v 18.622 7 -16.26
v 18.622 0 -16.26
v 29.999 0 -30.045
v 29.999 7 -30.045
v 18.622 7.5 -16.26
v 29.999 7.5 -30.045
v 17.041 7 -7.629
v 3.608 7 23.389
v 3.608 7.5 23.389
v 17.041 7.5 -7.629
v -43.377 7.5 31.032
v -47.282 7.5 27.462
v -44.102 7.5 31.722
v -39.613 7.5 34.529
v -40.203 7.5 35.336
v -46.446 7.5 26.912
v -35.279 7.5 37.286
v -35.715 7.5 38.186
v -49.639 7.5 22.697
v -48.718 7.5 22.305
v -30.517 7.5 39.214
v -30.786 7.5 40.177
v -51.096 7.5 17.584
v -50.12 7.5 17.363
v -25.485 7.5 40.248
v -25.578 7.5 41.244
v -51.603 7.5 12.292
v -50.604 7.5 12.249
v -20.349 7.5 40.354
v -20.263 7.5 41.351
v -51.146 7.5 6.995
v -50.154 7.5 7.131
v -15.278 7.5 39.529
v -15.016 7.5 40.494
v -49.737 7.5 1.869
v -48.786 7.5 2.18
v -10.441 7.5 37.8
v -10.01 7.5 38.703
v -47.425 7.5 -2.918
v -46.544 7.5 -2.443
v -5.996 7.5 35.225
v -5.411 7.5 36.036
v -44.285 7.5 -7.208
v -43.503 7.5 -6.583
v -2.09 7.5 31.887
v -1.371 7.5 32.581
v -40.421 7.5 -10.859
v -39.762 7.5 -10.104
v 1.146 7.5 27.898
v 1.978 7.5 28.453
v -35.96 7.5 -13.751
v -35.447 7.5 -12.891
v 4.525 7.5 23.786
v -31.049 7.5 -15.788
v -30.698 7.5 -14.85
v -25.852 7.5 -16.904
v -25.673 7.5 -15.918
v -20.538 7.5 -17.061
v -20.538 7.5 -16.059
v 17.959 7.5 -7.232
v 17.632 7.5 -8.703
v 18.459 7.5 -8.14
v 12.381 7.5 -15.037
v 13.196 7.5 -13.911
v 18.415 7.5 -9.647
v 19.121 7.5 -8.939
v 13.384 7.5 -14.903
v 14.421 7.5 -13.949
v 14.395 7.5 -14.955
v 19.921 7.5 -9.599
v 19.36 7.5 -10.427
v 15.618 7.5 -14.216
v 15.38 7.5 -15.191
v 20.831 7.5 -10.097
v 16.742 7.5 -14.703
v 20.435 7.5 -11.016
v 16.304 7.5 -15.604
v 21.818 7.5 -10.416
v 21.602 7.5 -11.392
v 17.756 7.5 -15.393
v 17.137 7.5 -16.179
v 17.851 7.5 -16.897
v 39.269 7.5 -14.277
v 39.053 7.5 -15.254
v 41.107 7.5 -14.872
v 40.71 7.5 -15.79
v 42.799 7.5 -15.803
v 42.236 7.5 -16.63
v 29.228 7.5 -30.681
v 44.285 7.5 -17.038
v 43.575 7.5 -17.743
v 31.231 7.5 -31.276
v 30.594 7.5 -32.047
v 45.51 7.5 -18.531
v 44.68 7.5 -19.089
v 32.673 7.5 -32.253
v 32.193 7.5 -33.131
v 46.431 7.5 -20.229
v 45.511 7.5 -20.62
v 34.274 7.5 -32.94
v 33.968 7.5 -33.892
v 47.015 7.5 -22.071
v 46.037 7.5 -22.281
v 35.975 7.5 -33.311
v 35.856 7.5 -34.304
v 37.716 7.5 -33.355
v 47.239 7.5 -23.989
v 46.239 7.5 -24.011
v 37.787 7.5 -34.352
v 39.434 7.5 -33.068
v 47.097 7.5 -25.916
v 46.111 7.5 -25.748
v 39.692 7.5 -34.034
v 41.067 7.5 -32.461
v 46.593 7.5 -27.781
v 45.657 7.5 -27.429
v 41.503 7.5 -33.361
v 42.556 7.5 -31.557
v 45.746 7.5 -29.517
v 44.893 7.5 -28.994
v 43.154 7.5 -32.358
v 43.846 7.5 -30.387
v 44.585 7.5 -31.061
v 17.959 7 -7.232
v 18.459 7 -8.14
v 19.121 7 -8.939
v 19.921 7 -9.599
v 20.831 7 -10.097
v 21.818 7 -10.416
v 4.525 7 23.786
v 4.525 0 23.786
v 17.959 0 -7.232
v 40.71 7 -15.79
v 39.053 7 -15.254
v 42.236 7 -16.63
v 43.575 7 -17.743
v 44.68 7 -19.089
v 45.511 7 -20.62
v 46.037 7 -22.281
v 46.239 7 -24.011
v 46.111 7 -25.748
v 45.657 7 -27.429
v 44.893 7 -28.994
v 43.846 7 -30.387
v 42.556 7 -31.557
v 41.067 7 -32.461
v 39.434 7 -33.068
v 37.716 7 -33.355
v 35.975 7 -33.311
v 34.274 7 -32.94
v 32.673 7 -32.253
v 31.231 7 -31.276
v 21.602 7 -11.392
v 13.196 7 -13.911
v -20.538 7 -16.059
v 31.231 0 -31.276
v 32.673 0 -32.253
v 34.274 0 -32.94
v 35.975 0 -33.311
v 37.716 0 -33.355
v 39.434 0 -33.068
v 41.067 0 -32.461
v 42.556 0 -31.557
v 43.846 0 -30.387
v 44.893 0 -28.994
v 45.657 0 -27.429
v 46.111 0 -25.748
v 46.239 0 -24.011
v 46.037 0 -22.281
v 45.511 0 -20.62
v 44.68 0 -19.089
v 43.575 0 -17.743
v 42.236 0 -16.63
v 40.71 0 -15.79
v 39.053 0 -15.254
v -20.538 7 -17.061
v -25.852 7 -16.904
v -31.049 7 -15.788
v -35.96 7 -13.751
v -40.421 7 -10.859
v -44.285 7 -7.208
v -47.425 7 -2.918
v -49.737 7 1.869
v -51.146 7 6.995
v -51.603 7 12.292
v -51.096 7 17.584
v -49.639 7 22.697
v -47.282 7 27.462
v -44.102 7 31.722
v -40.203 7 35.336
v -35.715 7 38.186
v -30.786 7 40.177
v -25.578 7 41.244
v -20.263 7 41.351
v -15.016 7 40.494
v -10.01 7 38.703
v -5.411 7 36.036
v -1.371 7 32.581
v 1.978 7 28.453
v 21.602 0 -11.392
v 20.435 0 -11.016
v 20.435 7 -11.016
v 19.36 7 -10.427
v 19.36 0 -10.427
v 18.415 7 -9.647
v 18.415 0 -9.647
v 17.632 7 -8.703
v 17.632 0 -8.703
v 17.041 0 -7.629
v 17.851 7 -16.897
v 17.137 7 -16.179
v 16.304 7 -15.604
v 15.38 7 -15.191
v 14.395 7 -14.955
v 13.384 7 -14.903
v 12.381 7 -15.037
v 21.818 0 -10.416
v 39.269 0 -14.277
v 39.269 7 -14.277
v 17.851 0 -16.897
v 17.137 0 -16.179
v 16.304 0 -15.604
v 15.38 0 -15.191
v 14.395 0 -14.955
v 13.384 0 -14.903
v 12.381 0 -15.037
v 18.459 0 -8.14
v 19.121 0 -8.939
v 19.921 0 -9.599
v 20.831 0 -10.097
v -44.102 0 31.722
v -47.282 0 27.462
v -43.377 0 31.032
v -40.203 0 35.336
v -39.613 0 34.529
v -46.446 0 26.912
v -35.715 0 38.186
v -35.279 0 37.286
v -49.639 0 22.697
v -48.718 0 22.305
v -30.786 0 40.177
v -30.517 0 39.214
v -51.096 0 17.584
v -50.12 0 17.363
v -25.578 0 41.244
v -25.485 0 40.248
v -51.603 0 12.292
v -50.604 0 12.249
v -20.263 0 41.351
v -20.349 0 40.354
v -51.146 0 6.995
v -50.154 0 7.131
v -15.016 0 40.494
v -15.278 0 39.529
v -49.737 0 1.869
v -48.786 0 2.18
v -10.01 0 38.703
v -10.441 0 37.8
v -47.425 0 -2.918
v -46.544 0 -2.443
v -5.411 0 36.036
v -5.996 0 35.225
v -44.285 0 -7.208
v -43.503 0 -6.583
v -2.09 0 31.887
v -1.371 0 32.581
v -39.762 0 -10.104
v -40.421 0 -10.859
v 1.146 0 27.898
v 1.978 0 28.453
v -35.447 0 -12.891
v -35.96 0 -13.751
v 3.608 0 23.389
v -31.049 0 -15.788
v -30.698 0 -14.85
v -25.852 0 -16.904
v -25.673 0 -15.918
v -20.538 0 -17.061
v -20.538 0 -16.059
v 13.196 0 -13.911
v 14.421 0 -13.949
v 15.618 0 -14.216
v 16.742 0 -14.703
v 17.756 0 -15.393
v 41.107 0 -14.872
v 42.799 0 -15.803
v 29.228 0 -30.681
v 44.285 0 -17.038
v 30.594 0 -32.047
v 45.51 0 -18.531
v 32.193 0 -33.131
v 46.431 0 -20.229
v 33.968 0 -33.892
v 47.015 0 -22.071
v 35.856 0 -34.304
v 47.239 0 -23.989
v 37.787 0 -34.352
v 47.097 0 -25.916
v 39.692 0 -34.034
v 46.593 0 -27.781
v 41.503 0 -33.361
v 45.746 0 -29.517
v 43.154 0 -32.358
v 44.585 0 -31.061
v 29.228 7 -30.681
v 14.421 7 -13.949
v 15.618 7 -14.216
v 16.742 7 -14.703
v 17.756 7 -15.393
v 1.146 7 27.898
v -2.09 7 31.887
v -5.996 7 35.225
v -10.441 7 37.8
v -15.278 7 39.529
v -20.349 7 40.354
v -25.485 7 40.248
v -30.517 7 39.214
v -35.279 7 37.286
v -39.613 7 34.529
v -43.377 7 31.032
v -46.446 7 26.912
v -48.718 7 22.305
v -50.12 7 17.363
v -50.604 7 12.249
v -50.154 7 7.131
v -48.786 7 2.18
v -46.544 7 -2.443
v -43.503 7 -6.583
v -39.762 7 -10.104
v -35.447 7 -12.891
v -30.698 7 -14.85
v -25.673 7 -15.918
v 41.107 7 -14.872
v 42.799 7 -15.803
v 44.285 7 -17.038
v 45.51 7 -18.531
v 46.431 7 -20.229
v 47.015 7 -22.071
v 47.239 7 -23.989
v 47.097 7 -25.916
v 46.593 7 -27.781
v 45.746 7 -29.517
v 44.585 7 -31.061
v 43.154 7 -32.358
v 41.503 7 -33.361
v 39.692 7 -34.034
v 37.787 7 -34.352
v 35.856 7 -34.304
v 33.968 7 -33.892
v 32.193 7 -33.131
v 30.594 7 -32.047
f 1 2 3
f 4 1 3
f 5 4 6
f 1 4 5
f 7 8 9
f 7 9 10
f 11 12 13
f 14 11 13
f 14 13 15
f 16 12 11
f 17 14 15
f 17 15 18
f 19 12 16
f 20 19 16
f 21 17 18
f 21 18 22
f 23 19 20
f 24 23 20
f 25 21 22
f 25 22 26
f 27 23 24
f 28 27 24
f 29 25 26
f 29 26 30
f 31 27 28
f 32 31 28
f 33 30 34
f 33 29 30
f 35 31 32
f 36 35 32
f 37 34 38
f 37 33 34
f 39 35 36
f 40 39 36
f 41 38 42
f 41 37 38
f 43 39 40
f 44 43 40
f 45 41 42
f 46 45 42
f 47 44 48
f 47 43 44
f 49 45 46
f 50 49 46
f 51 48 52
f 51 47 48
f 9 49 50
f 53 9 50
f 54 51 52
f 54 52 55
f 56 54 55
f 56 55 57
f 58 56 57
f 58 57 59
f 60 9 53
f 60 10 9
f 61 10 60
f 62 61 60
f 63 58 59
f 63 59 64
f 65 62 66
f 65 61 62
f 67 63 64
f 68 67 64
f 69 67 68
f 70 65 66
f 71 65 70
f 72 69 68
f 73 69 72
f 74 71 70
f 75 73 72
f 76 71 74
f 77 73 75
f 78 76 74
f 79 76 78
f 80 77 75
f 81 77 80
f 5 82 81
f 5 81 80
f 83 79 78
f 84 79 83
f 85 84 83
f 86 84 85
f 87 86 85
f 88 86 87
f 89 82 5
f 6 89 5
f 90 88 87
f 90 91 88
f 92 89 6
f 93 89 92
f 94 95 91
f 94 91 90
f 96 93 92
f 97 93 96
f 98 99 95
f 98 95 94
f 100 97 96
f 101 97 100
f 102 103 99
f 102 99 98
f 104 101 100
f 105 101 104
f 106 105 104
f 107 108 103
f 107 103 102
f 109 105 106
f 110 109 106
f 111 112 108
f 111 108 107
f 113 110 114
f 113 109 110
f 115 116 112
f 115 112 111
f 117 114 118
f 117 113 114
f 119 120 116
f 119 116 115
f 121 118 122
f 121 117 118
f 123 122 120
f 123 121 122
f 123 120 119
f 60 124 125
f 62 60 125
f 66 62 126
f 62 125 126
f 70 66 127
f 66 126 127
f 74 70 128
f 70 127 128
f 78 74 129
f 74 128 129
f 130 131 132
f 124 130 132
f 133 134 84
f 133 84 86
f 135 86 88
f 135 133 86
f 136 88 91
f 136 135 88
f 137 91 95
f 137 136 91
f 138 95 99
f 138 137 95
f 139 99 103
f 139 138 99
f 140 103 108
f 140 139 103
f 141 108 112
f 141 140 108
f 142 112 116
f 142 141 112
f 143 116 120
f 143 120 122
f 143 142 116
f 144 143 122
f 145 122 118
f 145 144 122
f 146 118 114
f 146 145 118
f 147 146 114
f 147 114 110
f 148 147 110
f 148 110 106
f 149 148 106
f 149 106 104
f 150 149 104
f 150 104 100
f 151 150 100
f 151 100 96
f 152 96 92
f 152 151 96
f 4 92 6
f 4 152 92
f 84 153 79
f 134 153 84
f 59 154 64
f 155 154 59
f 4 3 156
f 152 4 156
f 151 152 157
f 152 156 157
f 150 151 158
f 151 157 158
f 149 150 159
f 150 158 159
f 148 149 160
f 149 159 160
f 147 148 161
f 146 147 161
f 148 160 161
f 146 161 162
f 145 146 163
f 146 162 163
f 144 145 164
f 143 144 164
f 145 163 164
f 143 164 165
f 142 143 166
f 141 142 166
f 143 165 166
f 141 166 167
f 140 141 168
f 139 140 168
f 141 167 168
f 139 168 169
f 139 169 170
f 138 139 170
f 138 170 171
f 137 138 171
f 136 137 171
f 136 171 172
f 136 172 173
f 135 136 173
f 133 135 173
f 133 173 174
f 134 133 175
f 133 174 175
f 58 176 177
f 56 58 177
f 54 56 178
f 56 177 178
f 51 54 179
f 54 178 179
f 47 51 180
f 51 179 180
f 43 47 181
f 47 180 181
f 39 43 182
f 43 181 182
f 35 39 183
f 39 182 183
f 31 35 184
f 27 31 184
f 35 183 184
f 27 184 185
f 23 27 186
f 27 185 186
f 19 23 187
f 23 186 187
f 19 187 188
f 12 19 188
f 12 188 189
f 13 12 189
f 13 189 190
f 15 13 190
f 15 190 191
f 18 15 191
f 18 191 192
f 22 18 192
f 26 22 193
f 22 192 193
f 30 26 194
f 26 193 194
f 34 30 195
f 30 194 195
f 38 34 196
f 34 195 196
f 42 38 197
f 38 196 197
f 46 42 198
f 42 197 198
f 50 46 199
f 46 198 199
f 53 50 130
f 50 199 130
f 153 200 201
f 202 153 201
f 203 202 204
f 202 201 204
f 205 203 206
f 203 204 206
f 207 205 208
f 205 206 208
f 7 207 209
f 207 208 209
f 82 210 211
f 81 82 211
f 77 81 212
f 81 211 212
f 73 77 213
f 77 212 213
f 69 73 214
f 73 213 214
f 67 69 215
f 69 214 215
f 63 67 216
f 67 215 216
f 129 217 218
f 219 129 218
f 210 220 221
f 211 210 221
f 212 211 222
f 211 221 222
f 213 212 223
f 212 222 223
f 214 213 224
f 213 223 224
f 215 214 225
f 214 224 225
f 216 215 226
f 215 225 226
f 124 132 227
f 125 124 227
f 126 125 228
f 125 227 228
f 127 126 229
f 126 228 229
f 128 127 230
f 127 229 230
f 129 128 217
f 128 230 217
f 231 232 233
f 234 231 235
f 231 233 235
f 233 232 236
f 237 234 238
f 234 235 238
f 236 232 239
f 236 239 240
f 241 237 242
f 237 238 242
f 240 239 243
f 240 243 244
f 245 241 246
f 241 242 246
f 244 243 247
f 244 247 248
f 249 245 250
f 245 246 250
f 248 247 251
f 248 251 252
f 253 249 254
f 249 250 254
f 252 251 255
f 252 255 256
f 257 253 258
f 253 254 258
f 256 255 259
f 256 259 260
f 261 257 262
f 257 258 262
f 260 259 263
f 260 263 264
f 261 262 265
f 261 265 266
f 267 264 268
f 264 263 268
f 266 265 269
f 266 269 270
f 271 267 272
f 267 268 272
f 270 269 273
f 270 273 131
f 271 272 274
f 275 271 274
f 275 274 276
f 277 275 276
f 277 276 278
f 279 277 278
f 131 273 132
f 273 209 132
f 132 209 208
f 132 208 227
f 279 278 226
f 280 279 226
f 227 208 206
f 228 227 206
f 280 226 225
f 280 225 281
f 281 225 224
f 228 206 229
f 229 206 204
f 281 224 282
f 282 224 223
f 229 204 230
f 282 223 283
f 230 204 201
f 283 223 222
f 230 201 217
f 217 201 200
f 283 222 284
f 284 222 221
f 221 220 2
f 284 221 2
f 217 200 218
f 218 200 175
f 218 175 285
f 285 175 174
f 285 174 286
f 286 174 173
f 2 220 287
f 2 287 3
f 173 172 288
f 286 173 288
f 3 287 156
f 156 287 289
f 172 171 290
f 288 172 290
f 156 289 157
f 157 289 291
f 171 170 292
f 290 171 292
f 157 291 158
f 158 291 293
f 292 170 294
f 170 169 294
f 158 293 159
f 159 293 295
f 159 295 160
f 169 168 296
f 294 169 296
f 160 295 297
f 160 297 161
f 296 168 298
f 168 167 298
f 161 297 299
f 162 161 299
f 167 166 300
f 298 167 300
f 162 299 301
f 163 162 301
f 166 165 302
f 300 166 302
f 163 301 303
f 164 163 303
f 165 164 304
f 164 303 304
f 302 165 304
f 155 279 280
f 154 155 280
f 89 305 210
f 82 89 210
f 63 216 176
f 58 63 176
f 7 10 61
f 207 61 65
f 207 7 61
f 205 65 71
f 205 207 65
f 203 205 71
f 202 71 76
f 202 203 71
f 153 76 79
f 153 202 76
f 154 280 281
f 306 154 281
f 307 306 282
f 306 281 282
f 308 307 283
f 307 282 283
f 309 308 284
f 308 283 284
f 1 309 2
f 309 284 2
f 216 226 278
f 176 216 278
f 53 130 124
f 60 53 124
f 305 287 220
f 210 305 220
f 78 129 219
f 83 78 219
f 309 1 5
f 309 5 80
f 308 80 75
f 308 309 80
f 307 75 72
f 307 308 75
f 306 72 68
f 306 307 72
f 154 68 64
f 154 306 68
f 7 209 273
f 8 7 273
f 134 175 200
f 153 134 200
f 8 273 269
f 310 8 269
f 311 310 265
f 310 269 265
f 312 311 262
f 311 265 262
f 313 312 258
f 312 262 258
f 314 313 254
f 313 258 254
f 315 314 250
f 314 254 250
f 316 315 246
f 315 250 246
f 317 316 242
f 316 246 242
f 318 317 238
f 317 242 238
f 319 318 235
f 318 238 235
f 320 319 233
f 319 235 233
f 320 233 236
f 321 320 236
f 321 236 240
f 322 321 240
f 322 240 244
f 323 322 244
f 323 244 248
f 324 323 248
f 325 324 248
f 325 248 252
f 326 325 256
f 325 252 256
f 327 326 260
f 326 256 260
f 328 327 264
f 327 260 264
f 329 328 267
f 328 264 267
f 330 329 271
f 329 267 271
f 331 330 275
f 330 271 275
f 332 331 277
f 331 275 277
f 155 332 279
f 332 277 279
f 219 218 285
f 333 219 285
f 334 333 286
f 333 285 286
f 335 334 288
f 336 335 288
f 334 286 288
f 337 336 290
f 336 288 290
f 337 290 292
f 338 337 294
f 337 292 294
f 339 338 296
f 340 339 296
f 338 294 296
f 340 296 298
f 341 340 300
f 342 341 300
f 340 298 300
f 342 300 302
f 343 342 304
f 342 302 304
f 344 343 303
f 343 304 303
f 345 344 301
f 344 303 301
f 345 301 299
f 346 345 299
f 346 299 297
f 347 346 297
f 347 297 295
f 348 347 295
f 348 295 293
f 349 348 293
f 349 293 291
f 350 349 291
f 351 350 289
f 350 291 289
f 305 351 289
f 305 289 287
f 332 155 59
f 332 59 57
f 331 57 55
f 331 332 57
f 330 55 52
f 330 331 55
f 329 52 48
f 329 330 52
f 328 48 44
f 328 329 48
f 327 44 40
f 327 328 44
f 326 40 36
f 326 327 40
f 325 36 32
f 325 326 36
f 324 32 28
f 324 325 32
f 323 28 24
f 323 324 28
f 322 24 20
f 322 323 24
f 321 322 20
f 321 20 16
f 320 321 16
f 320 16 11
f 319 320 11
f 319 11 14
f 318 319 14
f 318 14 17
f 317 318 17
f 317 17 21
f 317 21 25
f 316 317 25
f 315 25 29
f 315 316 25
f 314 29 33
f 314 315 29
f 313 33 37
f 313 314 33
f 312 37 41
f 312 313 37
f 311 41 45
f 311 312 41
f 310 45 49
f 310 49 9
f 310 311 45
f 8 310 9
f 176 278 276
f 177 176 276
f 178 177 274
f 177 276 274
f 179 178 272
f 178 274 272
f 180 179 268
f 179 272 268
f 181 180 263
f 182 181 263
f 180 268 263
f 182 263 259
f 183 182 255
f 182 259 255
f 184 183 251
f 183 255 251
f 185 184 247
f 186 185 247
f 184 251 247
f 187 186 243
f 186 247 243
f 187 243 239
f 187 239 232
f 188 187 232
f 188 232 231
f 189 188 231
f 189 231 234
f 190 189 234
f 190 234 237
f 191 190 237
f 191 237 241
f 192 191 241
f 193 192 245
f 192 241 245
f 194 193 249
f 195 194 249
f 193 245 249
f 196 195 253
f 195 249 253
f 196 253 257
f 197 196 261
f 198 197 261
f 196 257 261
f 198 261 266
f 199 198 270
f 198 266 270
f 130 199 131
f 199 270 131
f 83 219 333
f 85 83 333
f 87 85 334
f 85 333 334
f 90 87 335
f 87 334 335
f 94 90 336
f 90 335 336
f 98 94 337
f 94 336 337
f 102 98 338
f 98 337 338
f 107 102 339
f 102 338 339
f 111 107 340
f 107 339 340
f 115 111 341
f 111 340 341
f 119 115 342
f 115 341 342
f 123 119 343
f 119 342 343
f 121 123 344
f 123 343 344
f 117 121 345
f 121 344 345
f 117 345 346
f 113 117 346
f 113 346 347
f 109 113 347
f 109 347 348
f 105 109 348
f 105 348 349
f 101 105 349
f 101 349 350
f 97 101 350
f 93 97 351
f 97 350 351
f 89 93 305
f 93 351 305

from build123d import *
from build123d.topology import SkipClean

# Parameters (mm, degrees)
BOSS_EXTRUDE1_DEPTH = 7
BOSS_EXTRUDE2_DEPTH = 0.5


with BuildPart() as part:
    # Sketch1 → Boss-Extrude1 (new body)
    with BuildSketch(Plane(origin=(0, 0, 0), x_dir=(1, 0, 0), z_dir=(0, 1, 0))):
        with BuildLine():
            Line((29.22824924, 30.681159688), (17.850659856, 16.897054356))
            ThreePointArc((17.850659856, 16.897054356), (15.379675631, 15.1910369), (12.380917697, 15.03705815))
            Line((12.380917697, 15.03705815), (-20.537634361, 17.060906053))
            ThreePointArc((-20.537634361, 17.060906053), (-47.281869491, -27.461627718), (4.525488573, -23.786335009))
            Line((4.525488573, -23.786335009), (17.958953394, 7.231589211))
            ThreePointArc((17.958953394, 7.231589211), (19.505297976, 9.287886756), (21.817685297, 10.415896524))
            Line((21.817685297, 10.415896524), (39.268754989, 14.277407445))
            ThreePointArc((39.268754989, 14.277407445), (45.745634232, 29.516516233), (29.22824924, 30.681159688))
        make_face()
        with BuildLine():
            ThreePointArc((3.607850555, -23.388917762), (-46.445589463, -26.91243355), (-20.537634361, 16.058950924))
            Line((-20.537634361, 16.058950924), (13.195989156, 13.911337267))
            ThreePointArc((13.195989156, 13.911337267), (16.191497408, 14.433261737), (18.621876492, 16.260481579))
            Line((18.621876492, 16.260481579), (29.999465876, 30.044586911))
            ThreePointArc((29.999465876, 30.044586911), (44.89272255, 28.994461003), (39.05270459, 15.253789658))
            Line((39.05270459, 15.253789658), (21.601634898, 11.392278737))
            ThreePointArc((21.601634898, 11.392278737), (18.868813518, 10.059176283), (17.041315376, 7.629006457))
            Line((17.041315376, 7.629006457), (3.607850555, -23.388917762))
        make_face(mode=Mode.SUBTRACT)
    extrude(amount=BOSS_EXTRUDE1_DEPTH)

    # Sketch2 → Boss-Extrude2 (add)
    with SkipClean():  # the faces are left unmerged after this step: merging them gives an invalid solid
        with BuildSketch(Plane(origin=(0, 7, 0), x_dir=(1, 0, 0), z_dir=(0, 1, 0))):
            with BuildLine():
                Line((4.525488573, -23.786335009), (17.958953394, 7.231589211))
                ThreePointArc((17.958953394, 7.231589211), (19.505297976, 9.287886756), (21.817685297, 10.415896524))
                Line((21.817685297, 10.415896524), (39.268754989, 14.277407445))
                ThreePointArc((39.268754989, 14.277407445), (45.745634232, 29.516516233), (29.22824924, 30.681159688))
                Line((29.22824924, 30.681159688), (17.850659856, 16.897054356))
                ThreePointArc((17.850659856, 16.897054356), (15.379675631, 15.1910369), (12.380917697, 15.03705815))
                Line((12.380917697, 15.03705815), (-20.537634361, 17.060906053))
                ThreePointArc((-20.537634361, 17.060906053), (-47.281869491, -27.461627718), (4.525488573, -23.786335009))
            make_face()
            with BuildLine():
                Line((21.601634898, 11.392278737), (39.05270459, 15.253789658))
                ThreePointArc((39.05270459, 15.253789658), (44.89272255, 28.994461003), (29.999465876, 30.044586911))
                Line((29.999465876, 30.044586911), (18.621876492, 16.260481579))
                ThreePointArc((18.621876492, 16.260481579), (16.191497408, 14.433261737), (13.195989156, 13.911337267))
                Line((13.195989156, 13.911337267), (-20.537634361, 16.058950924))
                ThreePointArc((-20.537634361, 16.058950924), (-46.445589463, -26.91243355), (3.607850555, -23.388917762))
                Line((3.607850555, -23.388917762), (17.041315376, 7.629006457))
                ThreePointArc((17.041315376, 7.629006457), (18.868813518, 10.059176283), (21.601634898, 11.392278737))
            make_face(mode=Mode.SUBTRACT)
        extrude(amount=BOSS_EXTRUDE2_DEPTH)


solid = part.part
